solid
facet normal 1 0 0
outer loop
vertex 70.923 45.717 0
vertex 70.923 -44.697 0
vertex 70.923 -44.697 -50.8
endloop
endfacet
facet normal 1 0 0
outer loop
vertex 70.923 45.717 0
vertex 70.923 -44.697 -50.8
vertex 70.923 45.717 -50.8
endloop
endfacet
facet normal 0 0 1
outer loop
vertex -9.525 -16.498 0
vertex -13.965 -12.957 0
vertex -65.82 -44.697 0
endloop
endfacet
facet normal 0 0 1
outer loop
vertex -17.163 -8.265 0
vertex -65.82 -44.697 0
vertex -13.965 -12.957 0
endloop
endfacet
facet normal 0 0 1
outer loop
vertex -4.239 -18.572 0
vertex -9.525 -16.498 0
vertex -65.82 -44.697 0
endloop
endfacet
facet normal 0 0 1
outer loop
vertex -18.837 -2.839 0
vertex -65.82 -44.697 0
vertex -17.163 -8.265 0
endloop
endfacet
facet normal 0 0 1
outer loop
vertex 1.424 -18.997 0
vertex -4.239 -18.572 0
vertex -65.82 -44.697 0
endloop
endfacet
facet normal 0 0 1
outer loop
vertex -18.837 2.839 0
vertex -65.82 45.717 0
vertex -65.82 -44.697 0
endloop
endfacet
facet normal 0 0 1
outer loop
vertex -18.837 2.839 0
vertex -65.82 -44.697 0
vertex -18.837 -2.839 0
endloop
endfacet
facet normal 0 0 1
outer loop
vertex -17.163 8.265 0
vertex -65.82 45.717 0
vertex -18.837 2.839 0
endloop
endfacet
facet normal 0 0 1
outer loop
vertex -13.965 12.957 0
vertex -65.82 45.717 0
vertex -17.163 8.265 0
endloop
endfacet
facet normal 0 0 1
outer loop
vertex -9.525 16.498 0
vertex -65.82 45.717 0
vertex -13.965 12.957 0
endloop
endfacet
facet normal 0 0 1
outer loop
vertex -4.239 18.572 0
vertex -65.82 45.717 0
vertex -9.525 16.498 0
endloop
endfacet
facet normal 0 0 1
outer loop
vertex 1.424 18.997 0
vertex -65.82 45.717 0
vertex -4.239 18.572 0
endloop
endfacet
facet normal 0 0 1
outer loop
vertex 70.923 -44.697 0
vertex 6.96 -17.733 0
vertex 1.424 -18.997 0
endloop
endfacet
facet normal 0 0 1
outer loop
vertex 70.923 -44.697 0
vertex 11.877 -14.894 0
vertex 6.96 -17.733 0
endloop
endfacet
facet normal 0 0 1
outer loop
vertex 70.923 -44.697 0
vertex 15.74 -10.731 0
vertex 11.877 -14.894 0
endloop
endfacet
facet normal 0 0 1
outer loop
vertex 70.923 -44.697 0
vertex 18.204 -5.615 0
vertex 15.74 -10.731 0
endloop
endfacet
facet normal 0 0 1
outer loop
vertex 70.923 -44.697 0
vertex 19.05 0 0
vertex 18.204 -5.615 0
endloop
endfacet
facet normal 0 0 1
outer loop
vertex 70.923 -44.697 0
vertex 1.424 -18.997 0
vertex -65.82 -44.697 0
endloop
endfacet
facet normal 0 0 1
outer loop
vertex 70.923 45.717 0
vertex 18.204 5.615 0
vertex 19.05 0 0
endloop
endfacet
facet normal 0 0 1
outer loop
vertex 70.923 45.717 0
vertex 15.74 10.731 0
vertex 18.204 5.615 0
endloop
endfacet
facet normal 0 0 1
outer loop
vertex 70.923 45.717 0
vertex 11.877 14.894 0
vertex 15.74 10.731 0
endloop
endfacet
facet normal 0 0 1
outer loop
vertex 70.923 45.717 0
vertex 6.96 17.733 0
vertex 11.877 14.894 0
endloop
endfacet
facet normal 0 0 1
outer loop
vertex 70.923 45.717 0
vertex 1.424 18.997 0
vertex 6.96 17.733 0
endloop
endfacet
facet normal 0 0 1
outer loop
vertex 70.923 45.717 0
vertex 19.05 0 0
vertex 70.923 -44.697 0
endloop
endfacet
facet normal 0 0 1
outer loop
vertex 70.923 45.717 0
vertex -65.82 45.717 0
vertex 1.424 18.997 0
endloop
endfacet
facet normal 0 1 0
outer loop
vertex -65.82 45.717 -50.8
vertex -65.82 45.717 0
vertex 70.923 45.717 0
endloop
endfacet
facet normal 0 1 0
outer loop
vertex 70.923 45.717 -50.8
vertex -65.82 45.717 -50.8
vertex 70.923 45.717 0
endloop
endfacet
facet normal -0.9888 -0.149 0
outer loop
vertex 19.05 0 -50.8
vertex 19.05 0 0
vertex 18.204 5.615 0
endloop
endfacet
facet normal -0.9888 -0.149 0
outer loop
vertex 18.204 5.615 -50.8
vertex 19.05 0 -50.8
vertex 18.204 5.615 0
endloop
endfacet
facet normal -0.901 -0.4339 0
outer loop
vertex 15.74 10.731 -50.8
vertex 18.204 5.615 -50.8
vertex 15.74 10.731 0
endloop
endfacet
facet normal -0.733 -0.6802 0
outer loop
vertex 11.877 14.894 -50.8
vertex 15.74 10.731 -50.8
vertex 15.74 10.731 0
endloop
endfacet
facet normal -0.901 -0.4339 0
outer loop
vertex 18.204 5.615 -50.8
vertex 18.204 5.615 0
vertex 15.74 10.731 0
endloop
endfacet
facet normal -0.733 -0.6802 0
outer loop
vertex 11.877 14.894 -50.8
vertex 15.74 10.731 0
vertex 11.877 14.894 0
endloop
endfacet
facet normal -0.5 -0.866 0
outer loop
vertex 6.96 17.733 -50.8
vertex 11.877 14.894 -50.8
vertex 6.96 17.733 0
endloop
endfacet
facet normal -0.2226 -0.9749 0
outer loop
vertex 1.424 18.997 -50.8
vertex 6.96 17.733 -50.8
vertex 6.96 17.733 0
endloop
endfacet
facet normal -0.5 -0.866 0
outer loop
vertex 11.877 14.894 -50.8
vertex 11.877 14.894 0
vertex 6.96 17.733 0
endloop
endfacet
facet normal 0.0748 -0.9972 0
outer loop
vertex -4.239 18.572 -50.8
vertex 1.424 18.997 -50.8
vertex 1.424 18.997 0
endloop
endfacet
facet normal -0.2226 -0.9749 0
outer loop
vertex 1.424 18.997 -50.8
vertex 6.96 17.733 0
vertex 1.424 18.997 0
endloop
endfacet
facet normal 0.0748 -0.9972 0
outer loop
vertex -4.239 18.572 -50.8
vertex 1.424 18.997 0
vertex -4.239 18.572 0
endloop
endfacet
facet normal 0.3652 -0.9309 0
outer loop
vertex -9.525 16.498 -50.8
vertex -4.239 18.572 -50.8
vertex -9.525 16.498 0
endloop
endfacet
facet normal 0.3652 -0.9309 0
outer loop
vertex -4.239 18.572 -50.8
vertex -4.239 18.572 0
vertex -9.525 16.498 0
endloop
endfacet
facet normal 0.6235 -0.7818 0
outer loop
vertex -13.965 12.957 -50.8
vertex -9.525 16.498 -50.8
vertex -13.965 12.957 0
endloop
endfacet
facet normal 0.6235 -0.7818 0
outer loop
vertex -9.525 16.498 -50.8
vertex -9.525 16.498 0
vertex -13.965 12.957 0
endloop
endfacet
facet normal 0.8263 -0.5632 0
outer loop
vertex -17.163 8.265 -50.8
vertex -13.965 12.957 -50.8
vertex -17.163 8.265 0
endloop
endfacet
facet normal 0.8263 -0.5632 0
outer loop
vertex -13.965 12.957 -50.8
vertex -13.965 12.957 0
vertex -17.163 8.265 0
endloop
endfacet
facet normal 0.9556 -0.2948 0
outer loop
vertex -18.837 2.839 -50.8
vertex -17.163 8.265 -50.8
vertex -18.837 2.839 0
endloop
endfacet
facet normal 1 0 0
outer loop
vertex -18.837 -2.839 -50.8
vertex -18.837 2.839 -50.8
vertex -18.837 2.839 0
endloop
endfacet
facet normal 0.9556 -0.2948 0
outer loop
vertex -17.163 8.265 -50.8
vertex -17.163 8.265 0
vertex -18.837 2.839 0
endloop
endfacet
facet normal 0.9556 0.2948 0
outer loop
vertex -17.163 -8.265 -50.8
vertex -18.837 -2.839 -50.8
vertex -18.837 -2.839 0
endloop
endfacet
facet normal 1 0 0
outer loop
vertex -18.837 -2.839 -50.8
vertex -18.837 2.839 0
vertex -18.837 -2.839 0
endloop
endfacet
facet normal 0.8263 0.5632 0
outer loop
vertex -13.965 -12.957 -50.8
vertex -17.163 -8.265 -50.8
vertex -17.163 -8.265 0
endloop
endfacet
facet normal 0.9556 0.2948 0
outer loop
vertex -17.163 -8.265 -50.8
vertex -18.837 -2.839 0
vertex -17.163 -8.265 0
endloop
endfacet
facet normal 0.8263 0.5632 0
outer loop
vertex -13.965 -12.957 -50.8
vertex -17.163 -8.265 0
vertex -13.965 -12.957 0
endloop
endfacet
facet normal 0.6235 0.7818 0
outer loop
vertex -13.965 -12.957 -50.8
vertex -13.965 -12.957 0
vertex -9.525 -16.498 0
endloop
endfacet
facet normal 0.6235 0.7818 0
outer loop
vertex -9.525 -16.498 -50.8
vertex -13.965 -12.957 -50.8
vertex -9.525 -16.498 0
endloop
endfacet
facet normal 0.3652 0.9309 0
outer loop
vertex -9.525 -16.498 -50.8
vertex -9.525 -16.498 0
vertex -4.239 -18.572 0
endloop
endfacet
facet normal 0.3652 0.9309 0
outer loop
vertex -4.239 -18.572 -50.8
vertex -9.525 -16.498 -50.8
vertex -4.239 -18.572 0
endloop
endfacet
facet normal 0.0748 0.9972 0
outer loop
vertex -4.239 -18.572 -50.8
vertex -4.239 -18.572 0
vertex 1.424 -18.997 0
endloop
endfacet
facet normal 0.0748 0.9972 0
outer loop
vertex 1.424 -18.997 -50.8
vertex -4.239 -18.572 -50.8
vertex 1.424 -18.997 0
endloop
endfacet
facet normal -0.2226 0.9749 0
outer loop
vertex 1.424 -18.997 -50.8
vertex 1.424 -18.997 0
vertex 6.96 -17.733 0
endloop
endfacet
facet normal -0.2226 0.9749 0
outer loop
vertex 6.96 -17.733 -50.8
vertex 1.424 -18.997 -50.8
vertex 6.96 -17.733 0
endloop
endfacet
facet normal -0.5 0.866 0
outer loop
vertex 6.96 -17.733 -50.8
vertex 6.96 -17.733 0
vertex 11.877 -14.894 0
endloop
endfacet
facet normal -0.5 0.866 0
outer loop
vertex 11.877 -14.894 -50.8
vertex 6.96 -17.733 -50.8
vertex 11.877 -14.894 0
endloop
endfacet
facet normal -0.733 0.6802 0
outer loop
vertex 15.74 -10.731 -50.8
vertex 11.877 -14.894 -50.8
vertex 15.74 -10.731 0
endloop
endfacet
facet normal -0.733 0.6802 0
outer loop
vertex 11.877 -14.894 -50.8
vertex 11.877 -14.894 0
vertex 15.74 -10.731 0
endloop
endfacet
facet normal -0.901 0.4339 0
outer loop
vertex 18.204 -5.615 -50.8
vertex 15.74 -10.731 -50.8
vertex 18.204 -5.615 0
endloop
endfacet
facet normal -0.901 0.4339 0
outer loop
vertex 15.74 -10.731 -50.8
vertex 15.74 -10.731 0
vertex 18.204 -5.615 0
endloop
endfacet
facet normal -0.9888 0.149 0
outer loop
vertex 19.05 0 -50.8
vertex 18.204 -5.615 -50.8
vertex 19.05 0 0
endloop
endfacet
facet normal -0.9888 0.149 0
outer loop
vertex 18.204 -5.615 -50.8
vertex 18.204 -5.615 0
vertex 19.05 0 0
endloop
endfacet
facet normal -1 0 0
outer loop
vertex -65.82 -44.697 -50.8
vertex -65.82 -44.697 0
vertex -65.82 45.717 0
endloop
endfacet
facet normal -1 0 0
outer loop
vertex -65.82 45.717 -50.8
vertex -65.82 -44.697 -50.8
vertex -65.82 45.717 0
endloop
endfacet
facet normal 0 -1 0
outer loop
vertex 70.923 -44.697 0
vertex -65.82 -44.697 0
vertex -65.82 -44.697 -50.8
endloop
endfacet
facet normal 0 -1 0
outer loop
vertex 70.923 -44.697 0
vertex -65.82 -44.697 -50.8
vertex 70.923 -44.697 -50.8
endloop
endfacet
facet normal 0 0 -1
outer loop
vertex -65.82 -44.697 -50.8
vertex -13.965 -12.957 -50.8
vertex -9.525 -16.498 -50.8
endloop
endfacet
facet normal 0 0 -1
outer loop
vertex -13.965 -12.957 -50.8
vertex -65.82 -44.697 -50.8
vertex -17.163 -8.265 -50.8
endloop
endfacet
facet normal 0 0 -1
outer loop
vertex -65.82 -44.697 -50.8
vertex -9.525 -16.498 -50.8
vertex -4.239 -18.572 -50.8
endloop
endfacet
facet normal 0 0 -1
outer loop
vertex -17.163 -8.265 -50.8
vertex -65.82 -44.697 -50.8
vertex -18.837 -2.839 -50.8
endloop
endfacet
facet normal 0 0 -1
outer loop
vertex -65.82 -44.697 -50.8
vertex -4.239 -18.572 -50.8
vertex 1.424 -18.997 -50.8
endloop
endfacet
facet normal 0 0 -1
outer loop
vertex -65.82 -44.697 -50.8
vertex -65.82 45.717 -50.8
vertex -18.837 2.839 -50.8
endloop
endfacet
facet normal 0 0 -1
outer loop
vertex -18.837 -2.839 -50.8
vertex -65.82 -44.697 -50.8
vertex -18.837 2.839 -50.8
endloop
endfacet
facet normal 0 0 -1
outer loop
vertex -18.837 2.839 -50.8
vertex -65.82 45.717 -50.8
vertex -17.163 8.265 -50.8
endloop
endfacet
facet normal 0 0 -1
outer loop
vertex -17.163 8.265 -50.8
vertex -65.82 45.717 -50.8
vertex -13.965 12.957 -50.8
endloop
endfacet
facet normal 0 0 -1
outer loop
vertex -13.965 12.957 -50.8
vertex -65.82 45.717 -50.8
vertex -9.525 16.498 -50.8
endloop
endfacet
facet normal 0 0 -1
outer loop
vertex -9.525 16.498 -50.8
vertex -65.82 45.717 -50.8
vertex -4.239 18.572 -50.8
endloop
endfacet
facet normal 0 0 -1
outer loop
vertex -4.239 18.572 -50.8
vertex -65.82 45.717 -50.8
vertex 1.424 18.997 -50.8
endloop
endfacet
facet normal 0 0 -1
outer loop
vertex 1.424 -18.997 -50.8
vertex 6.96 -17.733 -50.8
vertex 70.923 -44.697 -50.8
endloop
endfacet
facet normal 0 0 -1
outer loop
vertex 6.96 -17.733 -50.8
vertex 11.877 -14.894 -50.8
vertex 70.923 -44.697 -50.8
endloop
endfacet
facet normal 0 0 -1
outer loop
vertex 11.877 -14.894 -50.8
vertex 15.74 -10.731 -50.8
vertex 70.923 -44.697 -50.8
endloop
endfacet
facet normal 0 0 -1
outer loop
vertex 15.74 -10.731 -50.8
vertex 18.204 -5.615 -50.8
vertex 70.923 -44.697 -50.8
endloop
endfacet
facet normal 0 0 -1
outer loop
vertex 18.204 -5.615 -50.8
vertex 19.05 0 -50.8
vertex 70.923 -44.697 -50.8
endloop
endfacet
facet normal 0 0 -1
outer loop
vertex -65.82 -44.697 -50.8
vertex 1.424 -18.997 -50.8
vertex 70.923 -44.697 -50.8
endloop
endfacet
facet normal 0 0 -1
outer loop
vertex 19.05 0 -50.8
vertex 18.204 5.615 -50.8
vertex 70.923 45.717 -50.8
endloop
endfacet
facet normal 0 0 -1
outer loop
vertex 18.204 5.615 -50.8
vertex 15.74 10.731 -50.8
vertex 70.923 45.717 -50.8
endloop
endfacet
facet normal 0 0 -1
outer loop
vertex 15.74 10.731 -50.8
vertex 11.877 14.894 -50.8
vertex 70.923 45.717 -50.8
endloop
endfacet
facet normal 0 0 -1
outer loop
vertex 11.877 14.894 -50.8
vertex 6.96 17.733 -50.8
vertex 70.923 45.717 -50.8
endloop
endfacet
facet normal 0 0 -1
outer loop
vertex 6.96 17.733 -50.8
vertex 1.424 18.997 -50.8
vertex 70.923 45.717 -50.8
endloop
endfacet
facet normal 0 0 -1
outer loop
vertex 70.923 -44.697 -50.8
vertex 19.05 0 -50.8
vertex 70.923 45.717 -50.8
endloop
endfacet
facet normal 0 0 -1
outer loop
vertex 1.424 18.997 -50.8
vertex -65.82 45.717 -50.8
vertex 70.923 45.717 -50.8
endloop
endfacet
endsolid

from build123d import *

# Parameters (mm, degrees)
F0_W     = 136.742865
F0_H     = 90.413568
F0_R     = 19.05
F1_DEPTH = 50.8


with BuildPart() as f1:
    # F0 (on Top) → F1 (new body)
    with BuildSketch(Plane.XY):
        with Locations((2.551172, 0.510237)):
            Rectangle(F0_W, F0_H)
        Circle(F0_R, mode=Mode.SUBTRACT)
    extrude(amount=-F1_DEPTH)


solid = f1.part
